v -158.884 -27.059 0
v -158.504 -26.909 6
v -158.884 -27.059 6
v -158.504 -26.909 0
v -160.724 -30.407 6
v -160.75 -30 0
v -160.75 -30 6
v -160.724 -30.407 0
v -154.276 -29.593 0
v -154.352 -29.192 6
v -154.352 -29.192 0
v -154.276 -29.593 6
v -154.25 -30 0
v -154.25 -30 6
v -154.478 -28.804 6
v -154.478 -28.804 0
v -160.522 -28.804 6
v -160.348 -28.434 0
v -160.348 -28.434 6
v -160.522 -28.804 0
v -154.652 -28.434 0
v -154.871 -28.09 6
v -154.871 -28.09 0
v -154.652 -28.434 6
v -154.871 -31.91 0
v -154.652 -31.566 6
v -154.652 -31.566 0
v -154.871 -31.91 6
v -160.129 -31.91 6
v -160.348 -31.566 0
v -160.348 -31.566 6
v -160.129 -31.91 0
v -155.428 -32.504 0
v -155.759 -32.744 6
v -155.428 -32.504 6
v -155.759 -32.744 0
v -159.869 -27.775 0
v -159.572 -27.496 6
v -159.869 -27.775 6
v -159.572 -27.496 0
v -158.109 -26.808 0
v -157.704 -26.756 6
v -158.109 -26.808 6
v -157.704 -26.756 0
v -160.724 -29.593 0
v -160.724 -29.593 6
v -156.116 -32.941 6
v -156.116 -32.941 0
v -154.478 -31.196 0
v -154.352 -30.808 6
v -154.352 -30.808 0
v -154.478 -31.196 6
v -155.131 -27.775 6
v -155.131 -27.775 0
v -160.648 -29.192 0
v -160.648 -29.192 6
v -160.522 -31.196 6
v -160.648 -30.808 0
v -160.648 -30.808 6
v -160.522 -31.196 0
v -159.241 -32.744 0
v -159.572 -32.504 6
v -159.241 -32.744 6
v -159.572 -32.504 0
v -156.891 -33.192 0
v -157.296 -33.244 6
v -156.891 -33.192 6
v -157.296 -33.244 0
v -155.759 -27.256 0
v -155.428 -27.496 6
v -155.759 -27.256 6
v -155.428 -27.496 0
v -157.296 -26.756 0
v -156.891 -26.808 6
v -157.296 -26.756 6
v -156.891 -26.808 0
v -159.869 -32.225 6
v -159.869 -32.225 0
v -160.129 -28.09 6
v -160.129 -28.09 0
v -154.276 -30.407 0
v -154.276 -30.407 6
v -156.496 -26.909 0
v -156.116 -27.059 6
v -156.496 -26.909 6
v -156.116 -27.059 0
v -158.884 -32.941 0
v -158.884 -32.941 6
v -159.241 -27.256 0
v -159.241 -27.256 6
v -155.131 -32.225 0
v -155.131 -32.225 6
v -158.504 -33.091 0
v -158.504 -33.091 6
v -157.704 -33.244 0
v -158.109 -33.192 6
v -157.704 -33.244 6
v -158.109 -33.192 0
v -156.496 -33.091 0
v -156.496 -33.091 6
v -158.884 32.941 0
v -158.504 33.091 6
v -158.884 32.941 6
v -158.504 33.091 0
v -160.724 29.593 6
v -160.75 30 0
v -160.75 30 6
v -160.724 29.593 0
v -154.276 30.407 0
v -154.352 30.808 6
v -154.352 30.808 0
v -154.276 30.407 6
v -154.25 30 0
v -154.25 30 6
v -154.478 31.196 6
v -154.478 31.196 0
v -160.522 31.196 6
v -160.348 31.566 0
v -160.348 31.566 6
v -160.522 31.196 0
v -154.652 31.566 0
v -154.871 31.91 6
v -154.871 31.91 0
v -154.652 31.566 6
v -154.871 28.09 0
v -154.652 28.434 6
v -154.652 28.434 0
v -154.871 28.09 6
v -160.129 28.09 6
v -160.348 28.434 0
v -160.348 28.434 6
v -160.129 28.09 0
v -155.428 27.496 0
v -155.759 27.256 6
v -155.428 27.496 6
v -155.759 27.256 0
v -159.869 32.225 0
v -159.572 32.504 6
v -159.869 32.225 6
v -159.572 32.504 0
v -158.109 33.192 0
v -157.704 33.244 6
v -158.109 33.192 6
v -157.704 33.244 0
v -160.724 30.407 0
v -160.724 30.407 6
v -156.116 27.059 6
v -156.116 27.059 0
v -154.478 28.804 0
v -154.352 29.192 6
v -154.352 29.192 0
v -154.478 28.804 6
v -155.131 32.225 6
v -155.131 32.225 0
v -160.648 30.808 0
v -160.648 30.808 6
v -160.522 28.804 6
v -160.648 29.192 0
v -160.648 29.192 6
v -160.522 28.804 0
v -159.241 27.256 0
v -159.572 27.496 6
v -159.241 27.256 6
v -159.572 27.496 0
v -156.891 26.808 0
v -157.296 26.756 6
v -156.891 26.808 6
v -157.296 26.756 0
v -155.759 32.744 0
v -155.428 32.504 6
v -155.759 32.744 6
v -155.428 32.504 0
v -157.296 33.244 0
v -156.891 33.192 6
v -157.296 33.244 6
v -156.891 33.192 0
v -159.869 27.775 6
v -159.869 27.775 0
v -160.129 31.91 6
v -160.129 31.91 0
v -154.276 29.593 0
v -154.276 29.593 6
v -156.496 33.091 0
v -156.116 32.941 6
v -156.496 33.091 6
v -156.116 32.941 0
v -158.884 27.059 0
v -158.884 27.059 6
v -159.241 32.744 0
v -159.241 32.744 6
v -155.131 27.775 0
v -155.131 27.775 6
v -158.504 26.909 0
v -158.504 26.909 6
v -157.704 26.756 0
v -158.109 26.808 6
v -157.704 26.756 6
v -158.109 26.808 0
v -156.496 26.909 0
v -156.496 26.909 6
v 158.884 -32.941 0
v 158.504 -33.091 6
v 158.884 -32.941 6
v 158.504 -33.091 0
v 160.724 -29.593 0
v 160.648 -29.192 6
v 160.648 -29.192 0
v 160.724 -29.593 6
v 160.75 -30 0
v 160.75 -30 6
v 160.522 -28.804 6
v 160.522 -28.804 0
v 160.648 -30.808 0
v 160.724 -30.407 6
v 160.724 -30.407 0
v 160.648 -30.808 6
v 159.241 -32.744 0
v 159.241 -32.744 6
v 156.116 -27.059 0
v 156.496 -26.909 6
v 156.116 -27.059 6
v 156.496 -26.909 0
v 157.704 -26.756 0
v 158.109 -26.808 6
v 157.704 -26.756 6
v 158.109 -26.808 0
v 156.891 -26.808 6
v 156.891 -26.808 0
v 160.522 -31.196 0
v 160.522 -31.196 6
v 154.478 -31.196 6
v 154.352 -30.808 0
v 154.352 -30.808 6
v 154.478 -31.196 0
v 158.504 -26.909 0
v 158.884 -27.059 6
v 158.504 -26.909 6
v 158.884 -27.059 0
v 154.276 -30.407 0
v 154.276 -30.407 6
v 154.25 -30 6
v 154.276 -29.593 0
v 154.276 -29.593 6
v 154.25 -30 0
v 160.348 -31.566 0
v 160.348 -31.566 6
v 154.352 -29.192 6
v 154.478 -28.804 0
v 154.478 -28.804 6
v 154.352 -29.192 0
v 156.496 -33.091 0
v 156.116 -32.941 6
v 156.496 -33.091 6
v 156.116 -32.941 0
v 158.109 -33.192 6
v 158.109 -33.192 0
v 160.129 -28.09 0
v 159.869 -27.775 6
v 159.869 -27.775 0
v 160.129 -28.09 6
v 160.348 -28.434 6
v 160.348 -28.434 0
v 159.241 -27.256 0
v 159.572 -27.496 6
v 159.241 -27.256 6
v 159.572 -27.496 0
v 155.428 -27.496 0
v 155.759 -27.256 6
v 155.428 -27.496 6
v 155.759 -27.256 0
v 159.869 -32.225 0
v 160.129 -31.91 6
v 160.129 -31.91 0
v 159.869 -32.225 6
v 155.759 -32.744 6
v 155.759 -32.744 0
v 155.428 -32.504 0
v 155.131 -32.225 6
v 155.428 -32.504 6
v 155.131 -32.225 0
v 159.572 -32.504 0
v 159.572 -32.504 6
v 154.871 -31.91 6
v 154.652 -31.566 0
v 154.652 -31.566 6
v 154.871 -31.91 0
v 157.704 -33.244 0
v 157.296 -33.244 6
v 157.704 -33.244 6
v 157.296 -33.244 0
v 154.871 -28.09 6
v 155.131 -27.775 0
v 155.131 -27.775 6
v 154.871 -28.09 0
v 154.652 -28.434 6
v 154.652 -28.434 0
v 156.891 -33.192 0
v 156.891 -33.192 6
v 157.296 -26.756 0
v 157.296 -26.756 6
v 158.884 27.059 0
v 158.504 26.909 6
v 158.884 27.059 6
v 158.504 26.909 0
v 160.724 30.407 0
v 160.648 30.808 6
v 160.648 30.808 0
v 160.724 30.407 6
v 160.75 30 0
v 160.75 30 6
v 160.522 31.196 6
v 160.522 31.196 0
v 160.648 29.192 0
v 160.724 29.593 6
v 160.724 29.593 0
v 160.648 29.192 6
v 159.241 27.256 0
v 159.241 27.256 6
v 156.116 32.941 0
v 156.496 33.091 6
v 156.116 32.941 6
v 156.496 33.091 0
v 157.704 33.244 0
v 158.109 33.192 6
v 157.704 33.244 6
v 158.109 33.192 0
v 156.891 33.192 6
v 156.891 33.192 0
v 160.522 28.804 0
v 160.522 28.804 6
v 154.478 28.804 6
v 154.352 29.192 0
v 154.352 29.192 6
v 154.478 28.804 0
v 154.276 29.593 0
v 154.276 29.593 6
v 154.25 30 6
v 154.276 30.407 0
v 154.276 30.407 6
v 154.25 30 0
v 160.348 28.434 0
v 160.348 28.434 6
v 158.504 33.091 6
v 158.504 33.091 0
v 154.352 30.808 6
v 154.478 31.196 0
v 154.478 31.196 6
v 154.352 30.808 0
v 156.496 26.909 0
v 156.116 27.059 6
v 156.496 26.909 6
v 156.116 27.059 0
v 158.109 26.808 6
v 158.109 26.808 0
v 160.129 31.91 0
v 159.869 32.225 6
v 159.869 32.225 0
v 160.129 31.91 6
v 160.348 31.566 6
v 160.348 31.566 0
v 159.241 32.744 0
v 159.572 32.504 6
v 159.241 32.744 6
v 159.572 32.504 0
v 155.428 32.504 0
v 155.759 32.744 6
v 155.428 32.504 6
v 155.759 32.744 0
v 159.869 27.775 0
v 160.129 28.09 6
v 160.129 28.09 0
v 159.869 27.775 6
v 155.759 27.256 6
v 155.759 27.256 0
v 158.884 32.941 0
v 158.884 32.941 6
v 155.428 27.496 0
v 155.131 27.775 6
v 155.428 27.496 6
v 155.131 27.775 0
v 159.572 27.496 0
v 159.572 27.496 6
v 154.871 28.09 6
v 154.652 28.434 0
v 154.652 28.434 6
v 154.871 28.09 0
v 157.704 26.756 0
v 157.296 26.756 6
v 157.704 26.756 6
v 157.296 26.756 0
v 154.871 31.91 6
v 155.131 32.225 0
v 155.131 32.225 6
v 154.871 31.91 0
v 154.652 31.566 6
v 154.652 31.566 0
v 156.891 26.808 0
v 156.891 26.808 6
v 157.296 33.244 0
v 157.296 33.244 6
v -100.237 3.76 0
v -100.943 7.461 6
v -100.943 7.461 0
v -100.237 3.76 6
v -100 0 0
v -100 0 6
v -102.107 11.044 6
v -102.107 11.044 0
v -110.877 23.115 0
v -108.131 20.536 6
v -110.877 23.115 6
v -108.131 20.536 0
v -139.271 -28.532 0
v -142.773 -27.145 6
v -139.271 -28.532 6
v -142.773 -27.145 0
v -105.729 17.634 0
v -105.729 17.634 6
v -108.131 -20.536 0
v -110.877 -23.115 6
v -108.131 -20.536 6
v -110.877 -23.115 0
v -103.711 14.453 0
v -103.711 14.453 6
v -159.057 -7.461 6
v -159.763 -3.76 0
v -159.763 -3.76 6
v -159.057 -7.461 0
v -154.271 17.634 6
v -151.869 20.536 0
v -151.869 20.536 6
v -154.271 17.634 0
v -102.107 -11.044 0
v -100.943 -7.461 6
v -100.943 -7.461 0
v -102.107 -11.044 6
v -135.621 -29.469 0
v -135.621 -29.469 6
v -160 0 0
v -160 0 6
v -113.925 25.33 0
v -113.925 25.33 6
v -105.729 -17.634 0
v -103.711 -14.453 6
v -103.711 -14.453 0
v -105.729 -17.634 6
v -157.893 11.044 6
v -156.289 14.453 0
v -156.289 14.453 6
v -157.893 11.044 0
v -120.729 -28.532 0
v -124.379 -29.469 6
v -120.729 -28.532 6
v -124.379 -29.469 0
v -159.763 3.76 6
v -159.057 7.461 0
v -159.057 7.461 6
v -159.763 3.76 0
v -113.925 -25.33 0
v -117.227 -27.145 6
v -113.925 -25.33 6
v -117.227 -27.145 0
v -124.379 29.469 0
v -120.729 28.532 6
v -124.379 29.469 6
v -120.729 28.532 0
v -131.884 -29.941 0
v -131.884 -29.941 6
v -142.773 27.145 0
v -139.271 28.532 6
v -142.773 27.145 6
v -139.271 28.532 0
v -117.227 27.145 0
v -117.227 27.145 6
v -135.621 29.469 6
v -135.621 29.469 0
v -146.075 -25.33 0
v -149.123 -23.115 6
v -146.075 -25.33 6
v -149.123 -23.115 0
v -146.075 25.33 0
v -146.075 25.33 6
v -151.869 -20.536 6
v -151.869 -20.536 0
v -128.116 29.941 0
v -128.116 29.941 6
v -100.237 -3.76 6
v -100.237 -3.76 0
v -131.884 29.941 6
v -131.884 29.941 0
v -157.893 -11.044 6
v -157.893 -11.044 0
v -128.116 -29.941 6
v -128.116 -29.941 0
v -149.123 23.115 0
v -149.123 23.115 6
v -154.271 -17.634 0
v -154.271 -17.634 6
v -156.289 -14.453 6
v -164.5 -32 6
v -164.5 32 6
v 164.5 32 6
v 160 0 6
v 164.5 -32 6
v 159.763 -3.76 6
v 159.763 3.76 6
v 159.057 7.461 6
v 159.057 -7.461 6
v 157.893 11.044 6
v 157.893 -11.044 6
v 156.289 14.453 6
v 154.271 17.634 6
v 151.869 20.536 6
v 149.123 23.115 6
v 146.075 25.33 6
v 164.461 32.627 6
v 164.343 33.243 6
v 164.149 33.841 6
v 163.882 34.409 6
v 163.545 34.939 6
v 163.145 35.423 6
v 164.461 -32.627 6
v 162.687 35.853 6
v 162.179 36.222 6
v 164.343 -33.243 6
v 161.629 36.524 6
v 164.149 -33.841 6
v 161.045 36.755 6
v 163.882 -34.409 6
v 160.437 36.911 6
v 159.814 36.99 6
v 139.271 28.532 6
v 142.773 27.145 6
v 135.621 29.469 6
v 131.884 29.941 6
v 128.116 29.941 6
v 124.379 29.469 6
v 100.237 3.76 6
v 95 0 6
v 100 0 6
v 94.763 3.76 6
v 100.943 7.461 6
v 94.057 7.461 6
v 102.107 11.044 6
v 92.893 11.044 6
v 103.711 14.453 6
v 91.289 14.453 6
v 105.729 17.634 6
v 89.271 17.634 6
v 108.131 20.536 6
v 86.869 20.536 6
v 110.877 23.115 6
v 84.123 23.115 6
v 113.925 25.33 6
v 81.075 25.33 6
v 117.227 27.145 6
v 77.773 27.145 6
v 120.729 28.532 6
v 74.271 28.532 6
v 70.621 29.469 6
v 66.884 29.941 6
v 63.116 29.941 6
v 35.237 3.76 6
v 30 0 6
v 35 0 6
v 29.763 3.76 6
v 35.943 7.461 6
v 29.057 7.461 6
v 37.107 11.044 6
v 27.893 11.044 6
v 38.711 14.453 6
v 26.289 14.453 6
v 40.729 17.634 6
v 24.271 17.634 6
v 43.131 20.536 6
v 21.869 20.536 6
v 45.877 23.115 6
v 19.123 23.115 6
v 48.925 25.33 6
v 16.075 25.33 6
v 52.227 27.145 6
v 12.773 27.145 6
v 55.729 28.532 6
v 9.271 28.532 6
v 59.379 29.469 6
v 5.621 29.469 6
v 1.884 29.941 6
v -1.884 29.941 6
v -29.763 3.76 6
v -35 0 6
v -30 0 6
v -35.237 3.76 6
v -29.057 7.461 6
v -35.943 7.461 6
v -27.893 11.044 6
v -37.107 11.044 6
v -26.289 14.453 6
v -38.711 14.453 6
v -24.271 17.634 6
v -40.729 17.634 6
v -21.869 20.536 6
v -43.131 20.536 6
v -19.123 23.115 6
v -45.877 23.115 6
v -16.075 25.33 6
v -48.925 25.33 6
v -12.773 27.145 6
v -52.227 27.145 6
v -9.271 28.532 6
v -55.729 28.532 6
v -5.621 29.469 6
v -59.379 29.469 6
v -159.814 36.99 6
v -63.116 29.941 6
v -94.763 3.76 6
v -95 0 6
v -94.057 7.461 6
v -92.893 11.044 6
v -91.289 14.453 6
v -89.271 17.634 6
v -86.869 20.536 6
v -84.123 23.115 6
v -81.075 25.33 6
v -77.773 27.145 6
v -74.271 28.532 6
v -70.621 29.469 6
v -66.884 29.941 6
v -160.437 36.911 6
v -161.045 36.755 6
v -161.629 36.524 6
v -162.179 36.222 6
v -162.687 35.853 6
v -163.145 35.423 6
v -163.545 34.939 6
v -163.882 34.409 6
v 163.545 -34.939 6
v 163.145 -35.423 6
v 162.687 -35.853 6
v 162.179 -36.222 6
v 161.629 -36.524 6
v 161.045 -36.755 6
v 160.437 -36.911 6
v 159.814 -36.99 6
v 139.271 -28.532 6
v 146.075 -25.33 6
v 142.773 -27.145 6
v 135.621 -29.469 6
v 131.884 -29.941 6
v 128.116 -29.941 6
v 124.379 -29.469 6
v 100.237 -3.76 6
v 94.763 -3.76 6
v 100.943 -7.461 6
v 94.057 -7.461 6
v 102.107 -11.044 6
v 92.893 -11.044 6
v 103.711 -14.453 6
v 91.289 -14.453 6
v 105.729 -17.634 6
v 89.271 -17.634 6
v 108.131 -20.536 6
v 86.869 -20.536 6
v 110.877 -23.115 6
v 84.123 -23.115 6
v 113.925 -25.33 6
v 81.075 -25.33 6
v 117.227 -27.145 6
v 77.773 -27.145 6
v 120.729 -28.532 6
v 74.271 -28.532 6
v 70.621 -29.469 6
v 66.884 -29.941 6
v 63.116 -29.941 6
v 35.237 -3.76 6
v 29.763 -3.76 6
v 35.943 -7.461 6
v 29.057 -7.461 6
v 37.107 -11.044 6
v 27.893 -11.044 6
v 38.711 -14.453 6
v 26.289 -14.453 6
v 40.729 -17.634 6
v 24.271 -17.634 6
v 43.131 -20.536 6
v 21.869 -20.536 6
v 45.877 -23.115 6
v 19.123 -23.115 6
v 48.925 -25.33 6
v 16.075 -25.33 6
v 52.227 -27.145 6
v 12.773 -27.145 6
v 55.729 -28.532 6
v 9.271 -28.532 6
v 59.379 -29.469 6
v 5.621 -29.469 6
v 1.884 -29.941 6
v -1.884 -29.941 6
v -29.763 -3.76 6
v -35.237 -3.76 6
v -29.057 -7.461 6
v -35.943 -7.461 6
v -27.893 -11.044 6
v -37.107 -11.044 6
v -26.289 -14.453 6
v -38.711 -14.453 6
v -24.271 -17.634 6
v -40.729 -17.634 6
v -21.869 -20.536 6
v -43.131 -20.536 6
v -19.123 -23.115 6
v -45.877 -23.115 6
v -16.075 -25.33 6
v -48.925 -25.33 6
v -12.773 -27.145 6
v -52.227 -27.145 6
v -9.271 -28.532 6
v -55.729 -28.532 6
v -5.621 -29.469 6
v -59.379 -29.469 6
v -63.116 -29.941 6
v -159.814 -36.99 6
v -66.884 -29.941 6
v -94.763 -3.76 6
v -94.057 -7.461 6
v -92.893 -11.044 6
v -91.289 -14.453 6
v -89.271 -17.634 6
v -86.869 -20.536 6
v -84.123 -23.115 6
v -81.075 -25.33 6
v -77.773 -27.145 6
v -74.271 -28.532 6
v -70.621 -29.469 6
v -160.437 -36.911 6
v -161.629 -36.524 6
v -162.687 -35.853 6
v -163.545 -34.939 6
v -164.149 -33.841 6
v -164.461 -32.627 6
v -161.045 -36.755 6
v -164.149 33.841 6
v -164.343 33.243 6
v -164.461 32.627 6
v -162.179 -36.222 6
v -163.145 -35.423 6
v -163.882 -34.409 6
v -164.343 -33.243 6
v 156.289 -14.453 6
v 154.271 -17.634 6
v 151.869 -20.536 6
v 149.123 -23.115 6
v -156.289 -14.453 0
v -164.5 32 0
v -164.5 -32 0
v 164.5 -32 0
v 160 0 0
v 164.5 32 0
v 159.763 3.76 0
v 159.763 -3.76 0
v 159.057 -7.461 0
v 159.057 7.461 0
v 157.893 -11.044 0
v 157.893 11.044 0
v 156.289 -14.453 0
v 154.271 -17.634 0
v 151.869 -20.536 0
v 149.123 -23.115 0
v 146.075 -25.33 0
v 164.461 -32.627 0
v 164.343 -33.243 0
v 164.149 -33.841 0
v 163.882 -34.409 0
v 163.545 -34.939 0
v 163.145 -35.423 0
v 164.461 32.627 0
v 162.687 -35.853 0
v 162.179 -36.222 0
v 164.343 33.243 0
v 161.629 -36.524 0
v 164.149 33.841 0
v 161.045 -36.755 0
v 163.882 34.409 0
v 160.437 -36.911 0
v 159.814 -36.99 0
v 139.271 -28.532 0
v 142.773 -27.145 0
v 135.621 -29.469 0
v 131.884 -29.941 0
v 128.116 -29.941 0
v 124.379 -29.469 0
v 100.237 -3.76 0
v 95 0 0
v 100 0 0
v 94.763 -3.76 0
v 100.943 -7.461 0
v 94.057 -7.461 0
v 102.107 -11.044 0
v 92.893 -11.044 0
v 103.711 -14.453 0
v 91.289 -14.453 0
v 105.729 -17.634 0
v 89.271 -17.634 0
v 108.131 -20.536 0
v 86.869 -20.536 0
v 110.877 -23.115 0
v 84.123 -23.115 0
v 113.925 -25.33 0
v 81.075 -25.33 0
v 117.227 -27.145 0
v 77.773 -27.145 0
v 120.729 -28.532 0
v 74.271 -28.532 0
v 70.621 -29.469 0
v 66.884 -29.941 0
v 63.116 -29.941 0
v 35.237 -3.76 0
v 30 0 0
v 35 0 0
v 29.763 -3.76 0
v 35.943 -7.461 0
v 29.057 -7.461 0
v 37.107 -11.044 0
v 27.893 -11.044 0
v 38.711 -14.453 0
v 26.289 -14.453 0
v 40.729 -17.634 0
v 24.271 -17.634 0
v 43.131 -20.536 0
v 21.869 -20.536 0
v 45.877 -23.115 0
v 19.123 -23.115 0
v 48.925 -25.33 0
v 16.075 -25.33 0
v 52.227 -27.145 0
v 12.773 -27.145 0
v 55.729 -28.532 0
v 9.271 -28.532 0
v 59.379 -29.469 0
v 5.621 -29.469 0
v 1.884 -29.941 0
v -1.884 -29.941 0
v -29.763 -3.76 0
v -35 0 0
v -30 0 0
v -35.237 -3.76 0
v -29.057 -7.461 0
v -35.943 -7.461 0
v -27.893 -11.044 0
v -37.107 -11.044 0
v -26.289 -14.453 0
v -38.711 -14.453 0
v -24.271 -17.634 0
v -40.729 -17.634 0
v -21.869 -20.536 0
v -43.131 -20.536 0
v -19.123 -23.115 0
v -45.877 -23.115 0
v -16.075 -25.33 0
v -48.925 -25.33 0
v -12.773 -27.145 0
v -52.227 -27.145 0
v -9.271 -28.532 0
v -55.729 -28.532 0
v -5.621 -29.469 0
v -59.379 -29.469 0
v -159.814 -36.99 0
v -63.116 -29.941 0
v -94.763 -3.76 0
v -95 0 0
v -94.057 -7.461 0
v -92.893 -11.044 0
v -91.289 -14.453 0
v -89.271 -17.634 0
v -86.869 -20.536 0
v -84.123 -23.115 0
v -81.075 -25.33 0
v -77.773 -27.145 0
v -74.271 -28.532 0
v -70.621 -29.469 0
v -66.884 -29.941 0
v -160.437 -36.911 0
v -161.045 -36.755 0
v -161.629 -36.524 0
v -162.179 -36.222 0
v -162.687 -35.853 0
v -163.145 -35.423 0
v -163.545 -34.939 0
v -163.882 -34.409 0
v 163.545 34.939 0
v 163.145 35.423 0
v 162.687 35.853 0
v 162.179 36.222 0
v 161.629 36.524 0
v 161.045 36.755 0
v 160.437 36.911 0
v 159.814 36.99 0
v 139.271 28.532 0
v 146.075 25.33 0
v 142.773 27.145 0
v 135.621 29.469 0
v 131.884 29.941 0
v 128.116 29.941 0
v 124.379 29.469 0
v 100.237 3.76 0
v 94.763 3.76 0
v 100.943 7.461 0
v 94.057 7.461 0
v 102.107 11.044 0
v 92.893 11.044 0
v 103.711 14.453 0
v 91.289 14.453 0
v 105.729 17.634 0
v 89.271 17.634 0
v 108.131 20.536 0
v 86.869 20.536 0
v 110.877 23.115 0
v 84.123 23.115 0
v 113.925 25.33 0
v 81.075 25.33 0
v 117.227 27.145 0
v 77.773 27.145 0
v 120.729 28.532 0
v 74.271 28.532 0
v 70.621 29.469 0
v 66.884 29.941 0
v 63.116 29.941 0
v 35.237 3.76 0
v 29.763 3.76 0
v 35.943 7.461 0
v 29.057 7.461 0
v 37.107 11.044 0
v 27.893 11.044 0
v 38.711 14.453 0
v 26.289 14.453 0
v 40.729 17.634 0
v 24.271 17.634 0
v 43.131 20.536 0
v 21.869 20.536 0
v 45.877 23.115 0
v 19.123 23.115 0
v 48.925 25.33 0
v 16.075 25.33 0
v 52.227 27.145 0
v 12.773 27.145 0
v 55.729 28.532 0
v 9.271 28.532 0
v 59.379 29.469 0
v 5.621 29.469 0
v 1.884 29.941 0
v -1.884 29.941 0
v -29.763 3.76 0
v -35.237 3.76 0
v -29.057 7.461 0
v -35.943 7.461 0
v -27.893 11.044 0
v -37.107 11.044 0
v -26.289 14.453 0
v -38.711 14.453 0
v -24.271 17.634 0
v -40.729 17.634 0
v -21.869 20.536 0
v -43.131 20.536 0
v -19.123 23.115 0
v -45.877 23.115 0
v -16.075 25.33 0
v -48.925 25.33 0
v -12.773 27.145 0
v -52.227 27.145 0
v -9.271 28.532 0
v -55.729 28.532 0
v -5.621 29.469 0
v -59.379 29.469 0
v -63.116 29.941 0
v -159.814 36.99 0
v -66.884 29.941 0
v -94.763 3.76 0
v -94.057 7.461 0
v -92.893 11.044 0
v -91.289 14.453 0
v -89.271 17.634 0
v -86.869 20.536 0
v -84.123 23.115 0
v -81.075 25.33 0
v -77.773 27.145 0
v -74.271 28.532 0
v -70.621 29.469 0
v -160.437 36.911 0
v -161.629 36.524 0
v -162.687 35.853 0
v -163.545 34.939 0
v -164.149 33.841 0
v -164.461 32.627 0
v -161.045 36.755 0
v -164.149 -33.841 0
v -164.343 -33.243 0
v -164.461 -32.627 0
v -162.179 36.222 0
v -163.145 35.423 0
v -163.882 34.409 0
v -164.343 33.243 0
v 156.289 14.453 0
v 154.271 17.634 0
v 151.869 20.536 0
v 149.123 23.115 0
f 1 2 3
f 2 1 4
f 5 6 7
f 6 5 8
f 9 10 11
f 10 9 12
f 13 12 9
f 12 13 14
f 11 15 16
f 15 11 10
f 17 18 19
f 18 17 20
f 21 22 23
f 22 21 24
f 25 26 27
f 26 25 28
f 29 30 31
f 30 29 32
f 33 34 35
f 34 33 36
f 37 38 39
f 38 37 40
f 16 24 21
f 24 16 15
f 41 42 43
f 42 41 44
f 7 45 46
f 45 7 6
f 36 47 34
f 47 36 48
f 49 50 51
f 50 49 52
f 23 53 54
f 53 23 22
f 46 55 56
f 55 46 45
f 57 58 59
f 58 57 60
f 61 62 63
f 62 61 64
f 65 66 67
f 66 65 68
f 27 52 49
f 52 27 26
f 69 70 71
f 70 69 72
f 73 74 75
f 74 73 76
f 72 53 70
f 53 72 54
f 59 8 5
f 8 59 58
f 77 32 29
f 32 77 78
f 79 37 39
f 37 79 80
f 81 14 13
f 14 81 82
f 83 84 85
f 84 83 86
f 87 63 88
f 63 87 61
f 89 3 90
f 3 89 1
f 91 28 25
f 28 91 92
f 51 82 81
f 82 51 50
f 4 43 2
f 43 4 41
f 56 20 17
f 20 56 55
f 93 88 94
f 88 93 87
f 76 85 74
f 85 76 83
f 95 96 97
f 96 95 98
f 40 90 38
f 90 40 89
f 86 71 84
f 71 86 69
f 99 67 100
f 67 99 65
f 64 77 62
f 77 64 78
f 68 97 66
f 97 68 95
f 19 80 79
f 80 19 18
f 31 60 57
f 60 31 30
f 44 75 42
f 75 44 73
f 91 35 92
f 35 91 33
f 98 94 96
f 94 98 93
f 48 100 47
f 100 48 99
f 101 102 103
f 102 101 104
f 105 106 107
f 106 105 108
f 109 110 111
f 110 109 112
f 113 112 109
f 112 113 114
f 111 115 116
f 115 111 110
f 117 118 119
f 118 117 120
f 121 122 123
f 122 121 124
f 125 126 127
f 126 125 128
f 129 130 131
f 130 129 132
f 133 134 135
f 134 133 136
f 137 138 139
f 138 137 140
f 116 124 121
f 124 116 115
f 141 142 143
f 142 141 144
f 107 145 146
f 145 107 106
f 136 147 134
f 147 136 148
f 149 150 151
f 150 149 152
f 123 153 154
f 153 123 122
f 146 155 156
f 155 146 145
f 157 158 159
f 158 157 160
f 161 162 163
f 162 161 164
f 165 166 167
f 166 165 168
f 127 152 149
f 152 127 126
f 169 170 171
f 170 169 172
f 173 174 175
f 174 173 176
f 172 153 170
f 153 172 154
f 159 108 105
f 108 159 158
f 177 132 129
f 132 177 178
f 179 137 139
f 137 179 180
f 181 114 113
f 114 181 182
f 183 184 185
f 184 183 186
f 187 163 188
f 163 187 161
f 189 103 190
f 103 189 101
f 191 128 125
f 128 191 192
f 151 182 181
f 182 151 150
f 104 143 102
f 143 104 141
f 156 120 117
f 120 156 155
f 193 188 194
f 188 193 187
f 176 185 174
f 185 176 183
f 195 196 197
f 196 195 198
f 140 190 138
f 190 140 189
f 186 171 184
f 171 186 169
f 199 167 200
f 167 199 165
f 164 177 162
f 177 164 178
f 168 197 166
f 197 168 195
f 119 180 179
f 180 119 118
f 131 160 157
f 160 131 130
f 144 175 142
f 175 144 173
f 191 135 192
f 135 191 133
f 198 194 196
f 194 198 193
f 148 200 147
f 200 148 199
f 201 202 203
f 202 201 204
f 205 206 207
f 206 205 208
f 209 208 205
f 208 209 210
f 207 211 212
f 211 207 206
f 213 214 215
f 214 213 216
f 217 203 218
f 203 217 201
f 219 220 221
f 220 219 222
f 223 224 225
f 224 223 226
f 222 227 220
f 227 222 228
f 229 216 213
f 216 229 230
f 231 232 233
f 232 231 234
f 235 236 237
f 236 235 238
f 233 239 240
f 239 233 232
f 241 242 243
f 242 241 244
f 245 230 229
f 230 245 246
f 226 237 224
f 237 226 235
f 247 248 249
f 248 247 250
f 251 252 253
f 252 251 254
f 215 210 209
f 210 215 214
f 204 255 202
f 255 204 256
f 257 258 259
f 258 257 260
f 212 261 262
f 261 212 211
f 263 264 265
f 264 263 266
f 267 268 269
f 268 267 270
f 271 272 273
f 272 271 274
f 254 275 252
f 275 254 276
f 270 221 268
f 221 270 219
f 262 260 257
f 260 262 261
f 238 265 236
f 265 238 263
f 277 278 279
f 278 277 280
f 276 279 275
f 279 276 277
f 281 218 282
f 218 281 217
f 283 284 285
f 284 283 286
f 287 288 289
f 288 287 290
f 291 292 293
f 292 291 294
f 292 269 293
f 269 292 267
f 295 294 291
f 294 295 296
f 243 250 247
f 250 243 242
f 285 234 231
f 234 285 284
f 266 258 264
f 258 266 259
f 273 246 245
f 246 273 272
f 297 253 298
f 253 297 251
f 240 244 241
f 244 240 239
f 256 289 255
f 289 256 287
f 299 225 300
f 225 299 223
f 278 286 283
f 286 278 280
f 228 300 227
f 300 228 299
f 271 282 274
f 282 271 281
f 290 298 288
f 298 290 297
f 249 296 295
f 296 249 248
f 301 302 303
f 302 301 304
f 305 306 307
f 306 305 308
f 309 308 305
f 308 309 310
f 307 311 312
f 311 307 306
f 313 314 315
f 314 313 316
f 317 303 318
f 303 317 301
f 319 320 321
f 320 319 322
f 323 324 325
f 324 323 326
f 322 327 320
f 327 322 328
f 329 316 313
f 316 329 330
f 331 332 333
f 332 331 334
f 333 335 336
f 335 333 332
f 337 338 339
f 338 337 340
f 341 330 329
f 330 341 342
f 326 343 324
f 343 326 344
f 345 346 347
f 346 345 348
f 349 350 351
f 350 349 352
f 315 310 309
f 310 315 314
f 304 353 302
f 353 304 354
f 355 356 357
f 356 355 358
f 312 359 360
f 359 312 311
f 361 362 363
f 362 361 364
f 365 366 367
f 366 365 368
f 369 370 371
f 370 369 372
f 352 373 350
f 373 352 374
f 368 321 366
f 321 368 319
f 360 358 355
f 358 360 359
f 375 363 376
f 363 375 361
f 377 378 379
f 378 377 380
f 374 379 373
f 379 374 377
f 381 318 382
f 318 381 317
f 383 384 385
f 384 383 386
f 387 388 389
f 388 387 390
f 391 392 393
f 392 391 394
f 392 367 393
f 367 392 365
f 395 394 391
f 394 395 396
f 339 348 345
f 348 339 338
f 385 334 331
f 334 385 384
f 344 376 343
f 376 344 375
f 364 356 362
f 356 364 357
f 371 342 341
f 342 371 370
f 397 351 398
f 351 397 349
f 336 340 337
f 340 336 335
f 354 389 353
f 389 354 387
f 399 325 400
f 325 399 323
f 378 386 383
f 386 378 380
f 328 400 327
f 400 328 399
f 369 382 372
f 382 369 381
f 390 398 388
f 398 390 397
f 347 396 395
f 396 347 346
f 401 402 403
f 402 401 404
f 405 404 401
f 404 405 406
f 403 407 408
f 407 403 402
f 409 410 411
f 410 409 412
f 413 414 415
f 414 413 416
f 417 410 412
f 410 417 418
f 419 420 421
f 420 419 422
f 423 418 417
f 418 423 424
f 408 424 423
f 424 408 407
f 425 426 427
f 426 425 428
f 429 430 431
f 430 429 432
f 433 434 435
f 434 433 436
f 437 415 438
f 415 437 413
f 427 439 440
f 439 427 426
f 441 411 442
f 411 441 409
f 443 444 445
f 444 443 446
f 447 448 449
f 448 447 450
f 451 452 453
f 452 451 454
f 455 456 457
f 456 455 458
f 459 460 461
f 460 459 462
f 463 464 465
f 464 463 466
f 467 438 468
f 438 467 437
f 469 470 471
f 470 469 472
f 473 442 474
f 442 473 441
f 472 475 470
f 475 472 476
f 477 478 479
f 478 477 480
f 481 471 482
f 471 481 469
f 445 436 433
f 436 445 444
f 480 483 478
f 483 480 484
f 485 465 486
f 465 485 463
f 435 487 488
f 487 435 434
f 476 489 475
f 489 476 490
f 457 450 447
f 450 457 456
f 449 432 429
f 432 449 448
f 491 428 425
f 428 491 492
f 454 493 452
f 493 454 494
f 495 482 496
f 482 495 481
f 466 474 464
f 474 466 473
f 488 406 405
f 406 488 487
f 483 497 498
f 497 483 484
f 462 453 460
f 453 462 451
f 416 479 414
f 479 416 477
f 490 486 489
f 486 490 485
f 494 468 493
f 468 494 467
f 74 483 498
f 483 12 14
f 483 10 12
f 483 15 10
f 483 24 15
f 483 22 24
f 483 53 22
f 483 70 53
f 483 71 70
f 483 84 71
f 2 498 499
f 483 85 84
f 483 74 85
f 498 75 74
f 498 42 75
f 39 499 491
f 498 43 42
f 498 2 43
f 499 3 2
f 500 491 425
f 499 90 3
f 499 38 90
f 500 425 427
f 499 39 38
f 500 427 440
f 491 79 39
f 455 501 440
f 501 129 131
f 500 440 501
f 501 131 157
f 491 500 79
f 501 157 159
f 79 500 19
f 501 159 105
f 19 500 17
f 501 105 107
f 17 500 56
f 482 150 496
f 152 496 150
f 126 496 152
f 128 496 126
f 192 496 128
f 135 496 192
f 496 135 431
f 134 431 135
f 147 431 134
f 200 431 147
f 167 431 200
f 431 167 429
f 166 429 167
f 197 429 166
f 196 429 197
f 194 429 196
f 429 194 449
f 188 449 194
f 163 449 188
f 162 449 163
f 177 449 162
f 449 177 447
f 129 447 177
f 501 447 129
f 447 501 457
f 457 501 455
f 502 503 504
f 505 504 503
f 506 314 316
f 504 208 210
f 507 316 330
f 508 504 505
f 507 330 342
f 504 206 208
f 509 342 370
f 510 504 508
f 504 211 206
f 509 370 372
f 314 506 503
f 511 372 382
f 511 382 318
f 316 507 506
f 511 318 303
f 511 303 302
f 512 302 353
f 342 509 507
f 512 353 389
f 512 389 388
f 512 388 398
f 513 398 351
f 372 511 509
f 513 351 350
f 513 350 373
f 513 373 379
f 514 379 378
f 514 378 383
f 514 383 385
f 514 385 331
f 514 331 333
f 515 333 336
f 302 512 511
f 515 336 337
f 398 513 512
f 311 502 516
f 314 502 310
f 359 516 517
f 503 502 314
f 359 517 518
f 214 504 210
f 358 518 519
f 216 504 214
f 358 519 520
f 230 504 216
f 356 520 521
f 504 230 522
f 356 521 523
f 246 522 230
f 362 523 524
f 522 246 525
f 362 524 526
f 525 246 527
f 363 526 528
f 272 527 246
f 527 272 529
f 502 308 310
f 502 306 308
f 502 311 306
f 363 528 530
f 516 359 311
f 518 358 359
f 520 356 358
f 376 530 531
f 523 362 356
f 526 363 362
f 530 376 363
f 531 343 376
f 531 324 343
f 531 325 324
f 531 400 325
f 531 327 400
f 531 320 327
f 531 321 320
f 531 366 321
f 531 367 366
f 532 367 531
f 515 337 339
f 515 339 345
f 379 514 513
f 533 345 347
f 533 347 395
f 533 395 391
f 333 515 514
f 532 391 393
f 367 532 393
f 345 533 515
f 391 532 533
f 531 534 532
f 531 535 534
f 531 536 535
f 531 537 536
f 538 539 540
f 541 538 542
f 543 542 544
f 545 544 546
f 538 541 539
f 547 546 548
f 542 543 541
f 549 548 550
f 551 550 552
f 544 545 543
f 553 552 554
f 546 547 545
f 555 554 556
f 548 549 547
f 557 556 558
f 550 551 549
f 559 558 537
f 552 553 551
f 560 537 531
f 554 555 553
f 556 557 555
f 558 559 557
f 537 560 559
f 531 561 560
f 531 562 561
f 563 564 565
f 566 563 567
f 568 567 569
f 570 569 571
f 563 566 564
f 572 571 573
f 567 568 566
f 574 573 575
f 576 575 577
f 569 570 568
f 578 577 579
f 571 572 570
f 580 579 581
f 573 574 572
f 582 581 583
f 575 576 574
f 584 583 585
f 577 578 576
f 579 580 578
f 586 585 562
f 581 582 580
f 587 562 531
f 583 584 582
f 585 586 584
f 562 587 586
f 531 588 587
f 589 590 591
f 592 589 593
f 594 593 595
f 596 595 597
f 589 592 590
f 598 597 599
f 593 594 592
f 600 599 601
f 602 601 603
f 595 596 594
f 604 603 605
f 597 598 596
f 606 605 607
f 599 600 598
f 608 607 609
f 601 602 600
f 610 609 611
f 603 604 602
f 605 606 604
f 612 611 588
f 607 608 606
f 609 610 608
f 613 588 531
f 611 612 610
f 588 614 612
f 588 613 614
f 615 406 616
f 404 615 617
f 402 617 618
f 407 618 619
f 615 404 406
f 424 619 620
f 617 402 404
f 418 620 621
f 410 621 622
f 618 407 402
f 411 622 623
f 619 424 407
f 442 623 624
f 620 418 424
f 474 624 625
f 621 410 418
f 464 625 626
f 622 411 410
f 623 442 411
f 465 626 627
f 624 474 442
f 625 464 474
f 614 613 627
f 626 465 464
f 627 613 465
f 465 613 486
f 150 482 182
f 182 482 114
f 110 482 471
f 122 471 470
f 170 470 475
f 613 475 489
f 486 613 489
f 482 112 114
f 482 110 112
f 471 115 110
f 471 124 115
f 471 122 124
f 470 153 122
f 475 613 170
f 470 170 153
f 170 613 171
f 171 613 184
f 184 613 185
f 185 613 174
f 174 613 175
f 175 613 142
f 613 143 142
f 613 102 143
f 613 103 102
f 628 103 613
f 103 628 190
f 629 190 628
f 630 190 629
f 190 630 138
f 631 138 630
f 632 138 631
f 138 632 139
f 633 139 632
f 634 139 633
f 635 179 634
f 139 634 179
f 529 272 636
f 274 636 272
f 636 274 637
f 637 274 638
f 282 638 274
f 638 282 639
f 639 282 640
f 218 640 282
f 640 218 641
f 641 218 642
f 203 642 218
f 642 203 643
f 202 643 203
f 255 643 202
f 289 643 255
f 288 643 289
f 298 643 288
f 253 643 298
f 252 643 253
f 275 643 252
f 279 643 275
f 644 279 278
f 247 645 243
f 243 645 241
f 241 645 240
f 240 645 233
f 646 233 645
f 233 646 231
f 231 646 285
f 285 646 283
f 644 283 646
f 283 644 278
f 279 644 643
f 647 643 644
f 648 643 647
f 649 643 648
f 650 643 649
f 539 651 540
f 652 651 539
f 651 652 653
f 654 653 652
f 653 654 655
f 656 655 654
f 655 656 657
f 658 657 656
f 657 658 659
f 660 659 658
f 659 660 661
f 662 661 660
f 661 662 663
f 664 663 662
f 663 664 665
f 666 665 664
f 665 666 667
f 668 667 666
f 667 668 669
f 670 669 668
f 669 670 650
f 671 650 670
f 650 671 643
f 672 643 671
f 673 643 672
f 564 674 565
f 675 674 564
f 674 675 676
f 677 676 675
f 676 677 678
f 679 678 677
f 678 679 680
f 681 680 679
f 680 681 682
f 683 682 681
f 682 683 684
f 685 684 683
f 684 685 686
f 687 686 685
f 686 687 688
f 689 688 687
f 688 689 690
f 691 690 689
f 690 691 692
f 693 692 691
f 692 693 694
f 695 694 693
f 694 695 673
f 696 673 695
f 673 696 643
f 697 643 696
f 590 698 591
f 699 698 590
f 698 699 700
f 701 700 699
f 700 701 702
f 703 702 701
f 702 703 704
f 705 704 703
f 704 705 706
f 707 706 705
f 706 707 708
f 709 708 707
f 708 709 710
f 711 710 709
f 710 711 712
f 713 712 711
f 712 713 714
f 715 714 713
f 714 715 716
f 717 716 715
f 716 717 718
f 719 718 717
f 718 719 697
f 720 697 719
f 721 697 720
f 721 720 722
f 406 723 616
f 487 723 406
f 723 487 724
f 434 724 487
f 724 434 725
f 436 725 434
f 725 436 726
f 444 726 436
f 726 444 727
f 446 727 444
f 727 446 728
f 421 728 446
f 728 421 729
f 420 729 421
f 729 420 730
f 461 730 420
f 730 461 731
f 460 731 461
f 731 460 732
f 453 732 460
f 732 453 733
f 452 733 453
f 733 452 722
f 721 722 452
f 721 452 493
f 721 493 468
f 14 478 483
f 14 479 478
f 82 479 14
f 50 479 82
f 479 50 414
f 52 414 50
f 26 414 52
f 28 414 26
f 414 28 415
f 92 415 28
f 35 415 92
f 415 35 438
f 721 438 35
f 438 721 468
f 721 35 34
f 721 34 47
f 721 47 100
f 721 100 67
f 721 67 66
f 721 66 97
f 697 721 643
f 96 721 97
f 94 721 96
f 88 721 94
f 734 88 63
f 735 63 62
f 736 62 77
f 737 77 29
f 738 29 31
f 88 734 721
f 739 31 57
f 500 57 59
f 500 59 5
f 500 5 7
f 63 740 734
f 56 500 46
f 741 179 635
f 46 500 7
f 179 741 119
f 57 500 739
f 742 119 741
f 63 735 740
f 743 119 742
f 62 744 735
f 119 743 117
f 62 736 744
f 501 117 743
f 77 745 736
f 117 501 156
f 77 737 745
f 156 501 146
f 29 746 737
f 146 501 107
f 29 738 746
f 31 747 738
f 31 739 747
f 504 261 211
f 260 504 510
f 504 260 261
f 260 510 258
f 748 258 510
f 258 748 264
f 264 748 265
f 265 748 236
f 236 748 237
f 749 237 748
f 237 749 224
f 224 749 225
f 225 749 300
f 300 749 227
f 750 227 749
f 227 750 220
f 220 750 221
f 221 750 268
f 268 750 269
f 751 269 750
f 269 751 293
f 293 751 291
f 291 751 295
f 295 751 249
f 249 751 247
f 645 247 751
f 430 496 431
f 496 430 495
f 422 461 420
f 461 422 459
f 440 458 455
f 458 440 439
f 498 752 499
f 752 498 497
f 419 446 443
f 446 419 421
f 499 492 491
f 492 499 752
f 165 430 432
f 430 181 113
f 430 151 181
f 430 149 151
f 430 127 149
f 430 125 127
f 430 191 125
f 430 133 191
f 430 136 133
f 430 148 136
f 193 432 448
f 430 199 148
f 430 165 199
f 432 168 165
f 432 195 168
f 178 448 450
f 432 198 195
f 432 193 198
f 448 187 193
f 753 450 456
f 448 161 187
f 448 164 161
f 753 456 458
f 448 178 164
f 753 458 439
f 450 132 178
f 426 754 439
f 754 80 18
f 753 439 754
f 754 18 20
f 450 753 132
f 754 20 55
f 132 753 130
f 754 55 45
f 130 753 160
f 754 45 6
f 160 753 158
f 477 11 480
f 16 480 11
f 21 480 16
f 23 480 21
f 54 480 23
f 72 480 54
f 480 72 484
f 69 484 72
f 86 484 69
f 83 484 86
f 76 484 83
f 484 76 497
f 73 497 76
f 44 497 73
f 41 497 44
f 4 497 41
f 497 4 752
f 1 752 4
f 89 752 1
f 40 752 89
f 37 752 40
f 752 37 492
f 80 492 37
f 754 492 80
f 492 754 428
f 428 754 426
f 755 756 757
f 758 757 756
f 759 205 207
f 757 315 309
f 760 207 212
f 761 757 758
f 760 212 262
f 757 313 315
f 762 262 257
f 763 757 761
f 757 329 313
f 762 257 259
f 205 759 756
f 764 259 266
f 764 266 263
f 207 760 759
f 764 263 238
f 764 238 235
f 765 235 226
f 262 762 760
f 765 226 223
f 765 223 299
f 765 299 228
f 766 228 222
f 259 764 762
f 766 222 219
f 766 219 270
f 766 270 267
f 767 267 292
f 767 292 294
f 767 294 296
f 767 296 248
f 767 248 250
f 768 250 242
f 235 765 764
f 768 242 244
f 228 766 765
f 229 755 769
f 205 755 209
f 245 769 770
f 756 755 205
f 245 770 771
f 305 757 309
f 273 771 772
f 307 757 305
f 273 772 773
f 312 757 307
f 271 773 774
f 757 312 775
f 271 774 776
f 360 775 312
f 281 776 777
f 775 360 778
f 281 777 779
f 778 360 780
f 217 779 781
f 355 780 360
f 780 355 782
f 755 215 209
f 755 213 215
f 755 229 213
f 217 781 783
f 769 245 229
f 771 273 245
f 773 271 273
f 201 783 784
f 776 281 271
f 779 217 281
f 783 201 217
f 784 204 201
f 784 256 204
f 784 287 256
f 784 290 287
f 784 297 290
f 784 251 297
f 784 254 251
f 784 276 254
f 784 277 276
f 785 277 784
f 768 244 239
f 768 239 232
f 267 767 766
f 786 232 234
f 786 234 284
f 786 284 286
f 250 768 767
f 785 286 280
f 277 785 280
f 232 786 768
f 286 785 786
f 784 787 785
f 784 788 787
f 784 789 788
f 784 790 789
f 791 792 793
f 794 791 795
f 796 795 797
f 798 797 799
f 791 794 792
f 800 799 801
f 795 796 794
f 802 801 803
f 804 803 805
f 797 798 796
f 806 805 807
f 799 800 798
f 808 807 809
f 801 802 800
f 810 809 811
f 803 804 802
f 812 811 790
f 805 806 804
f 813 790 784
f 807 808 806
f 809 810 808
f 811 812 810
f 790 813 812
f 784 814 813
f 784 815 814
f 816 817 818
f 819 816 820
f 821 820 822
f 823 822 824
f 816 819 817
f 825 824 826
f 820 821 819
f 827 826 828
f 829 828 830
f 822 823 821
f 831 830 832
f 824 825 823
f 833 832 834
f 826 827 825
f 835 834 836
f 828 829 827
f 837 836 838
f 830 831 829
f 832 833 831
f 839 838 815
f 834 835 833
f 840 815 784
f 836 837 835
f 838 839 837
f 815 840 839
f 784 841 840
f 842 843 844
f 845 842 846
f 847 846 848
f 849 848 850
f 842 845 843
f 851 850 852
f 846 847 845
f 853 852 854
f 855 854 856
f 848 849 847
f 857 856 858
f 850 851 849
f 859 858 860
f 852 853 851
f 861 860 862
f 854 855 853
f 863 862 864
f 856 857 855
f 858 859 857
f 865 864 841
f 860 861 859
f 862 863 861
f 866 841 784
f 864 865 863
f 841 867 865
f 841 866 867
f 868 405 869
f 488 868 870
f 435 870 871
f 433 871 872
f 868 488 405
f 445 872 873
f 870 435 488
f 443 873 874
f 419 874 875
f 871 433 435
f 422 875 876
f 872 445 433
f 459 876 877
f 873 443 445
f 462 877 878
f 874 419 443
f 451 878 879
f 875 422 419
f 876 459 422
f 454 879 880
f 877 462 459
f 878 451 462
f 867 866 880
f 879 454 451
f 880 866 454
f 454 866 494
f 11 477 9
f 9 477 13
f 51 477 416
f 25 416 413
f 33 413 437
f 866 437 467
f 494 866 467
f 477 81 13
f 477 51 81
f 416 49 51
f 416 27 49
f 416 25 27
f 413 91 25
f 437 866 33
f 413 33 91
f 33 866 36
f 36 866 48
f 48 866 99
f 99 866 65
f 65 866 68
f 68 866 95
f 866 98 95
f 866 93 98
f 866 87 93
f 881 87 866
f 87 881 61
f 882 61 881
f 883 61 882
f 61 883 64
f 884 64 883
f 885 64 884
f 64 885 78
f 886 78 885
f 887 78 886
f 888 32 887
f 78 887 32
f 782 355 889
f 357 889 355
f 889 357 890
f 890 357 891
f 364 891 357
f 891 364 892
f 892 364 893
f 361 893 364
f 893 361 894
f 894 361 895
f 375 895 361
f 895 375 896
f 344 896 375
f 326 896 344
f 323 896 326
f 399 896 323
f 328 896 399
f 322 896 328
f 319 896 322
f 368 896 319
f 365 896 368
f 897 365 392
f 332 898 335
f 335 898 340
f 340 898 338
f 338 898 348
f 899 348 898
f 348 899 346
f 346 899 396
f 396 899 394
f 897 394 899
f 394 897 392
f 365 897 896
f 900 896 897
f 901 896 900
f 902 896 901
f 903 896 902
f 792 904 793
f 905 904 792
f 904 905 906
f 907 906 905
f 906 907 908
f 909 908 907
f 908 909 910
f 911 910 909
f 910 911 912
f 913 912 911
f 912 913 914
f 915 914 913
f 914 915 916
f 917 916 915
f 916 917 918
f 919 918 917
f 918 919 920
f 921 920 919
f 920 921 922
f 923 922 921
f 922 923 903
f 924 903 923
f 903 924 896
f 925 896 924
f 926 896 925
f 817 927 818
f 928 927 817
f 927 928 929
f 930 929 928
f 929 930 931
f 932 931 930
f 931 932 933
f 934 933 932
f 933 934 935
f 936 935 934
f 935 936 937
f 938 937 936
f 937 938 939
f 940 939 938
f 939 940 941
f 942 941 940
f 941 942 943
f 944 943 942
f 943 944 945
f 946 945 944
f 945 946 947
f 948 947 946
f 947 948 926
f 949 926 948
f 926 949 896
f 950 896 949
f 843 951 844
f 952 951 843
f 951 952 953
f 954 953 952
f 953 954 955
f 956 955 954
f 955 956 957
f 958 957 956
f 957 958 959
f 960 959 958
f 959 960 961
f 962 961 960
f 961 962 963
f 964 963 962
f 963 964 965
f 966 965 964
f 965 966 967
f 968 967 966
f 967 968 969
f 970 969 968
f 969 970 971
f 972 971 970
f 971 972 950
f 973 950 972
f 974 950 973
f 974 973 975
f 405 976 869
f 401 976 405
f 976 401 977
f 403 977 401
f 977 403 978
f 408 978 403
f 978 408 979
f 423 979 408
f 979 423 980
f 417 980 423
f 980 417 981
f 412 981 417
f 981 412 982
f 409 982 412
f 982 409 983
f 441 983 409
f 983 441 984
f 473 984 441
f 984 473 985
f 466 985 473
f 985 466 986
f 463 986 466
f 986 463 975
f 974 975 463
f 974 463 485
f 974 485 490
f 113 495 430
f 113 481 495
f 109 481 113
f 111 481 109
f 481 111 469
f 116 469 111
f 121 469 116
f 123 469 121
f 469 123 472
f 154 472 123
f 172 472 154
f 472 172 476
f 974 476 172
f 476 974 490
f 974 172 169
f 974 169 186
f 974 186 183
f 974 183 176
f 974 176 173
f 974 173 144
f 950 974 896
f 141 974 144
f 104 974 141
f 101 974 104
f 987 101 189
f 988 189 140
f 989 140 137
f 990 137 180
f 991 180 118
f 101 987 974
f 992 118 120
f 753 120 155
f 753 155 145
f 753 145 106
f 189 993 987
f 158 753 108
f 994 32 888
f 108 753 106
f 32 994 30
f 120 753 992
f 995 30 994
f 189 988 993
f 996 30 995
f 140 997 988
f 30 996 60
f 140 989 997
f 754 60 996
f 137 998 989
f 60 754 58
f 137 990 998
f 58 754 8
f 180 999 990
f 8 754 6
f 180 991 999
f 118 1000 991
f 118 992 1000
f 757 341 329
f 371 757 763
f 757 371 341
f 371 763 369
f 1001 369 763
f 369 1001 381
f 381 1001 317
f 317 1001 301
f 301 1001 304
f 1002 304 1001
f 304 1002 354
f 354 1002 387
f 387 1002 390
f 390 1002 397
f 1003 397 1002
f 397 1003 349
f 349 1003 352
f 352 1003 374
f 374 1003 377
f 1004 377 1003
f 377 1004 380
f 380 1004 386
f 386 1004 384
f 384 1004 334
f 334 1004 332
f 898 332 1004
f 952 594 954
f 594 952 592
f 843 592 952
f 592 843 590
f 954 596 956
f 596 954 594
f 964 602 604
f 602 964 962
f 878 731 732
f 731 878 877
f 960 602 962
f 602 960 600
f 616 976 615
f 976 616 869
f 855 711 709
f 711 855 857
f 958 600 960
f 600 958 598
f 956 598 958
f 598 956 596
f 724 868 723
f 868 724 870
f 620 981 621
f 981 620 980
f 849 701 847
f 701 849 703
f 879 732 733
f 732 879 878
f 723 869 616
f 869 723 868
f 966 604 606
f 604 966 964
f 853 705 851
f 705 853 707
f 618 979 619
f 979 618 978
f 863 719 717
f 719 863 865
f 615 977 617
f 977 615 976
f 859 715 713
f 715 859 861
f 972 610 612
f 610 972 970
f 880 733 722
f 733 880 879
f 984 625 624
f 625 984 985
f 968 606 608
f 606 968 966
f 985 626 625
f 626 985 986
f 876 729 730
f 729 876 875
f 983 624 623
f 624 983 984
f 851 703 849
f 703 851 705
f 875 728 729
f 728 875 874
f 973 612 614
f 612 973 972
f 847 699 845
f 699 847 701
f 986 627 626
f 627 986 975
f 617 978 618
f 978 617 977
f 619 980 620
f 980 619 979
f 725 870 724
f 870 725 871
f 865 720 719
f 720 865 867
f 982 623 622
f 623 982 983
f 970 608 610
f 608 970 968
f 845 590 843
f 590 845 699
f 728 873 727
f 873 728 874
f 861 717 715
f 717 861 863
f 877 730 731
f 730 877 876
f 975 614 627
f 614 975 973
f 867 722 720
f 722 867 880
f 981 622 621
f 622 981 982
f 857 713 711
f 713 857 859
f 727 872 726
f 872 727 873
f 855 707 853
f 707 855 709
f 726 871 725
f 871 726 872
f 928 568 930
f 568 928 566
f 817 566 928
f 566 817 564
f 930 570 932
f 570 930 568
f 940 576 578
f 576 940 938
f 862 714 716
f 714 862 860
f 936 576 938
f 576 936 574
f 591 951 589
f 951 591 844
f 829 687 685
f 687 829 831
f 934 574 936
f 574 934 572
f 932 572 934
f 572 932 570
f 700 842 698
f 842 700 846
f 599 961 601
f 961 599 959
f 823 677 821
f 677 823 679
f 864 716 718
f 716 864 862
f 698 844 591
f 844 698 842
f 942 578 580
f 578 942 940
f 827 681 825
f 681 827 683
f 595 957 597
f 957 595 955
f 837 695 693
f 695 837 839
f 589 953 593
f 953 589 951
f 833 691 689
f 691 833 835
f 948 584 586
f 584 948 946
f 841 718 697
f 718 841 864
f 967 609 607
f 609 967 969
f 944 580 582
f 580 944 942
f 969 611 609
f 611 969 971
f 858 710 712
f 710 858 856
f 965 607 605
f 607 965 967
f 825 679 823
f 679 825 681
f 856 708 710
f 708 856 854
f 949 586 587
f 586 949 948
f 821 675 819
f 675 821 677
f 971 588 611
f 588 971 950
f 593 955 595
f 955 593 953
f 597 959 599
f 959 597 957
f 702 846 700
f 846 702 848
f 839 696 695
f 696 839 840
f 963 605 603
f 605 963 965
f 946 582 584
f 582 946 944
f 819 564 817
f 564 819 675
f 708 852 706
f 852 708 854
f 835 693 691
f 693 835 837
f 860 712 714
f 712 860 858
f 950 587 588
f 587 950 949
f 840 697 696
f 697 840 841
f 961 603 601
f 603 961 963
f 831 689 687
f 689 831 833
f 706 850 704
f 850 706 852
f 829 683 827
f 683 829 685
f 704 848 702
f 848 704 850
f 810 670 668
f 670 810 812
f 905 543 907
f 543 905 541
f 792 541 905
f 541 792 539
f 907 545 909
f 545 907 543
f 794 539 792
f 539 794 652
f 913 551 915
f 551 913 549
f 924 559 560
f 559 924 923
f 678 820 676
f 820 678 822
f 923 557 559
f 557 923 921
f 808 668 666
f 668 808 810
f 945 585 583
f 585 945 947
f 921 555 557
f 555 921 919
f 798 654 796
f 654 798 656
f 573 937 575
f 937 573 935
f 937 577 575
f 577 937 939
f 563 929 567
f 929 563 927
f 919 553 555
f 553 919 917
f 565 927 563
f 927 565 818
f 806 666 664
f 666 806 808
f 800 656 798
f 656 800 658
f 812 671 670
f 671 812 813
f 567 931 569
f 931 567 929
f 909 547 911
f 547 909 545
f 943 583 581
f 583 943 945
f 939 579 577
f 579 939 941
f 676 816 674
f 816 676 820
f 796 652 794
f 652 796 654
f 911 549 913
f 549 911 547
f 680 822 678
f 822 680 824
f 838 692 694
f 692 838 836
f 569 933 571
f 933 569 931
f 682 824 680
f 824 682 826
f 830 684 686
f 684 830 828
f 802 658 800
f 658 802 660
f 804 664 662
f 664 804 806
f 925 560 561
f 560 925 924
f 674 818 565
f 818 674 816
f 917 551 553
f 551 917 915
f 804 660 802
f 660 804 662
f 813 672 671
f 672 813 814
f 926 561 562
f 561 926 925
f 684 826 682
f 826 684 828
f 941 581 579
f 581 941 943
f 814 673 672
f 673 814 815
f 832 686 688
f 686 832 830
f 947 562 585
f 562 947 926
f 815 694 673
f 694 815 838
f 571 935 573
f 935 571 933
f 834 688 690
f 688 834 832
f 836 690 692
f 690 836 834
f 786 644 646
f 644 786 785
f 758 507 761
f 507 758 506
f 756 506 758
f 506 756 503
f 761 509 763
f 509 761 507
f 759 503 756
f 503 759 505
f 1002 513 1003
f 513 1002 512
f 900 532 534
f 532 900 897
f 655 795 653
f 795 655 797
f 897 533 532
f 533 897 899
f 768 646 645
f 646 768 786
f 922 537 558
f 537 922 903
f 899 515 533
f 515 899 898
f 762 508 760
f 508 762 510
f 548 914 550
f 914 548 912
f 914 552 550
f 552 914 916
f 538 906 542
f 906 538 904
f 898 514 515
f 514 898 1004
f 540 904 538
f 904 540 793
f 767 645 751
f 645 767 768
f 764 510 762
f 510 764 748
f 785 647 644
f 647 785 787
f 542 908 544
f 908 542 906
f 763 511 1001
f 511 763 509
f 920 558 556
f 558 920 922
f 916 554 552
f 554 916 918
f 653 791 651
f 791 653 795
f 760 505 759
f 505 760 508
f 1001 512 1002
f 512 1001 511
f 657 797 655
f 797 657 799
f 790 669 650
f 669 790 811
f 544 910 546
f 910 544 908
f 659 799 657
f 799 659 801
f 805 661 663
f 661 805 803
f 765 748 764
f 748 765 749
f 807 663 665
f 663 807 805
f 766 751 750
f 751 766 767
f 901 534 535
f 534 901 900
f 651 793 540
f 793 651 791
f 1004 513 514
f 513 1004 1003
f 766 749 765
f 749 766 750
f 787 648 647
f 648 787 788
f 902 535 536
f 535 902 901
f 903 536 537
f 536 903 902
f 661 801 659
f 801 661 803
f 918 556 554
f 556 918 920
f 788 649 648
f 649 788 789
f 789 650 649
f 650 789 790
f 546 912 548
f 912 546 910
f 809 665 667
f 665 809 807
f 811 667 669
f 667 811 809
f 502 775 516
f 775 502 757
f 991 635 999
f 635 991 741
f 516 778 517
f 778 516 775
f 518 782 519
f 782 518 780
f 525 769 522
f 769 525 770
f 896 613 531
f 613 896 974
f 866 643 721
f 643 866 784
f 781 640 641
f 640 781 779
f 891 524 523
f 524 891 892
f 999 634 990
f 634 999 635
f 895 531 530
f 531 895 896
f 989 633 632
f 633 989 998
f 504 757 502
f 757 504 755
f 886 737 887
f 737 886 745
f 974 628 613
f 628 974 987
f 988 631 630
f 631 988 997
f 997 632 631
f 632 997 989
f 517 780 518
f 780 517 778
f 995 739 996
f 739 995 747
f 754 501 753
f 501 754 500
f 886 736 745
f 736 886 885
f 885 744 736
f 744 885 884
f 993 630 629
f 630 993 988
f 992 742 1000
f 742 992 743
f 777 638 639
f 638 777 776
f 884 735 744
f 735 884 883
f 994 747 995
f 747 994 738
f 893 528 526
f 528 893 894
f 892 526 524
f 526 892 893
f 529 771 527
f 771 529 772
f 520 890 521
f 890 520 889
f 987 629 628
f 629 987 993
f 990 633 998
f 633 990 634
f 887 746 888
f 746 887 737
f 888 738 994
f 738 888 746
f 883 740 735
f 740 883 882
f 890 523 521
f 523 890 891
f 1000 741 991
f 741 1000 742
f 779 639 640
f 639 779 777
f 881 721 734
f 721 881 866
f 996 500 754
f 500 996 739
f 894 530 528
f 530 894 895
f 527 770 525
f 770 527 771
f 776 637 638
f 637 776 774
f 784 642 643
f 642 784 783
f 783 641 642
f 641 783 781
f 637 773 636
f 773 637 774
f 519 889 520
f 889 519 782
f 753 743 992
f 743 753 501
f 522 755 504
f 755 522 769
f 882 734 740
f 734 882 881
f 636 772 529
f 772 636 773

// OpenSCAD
$fn = 50;

difference() {
	union() {
		hull() {
			translate(v = [-159.5, 32.0, 0]) {
				cylinder(h = 6, r = 5);
			}
			translate(v = [159.5, 32.0, 0]) {
				cylinder(h = 6, r = 5);
			}
			translate(v = [-159.5, -32.0, 0]) {
				cylinder(h = 6, r = 5);
			}
			translate(v = [159.5, -32.0, 0]) {
				cylinder(h = 6, r = 5);
			}
		}
	}
	union() {
		translate(v = [-157.5, -30.0, -100.0]) {
			cylinder(h = 200, r = 3.25);
		}
		translate(v = [-157.5, 30.0, -100.0]) {
			cylinder(h = 200, r = 3.25);
		}
		translate(v = [157.5, -30.0, -100.0]) {
			cylinder(h = 200, r = 3.25);
		}
		translate(v = [157.5, 30.0, -100.0]) {
			cylinder(h = 200, r = 3.25);
		}
		translate(v = [-157.5, -30.0, -100.0]) {
			cylinder(h = 200, r = 1.8);
		}
		translate(v = [-157.5, 30.0, -100.0]) {
			cylinder(h = 200, r = 1.8);
		}
		translate(v = [157.5, -30.0, -100.0]) {
			cylinder(h = 200, r = 1.8);
		}
		translate(v = [157.5, 30.0, -100.0]) {
			cylinder(h = 200, r = 1.8);
		}
		translate(v = [-130.0, 0, 0.0]) {
			cylinder(h = 6, r = 30.0);
		}
		translate(v = [-65.0, 0, 0.0]) {
			cylinder(h = 6, r = 30.0);
		}
		cylinder(h = 6, r = 30.0);
		translate(v = [65.0, 0, 0.0]) {
			cylinder(h = 6, r = 30.0);
		}
		translate(v = [130.0, 0, 0.0]) {
			cylinder(h = 6, r = 30.0);
		}
	}
}
